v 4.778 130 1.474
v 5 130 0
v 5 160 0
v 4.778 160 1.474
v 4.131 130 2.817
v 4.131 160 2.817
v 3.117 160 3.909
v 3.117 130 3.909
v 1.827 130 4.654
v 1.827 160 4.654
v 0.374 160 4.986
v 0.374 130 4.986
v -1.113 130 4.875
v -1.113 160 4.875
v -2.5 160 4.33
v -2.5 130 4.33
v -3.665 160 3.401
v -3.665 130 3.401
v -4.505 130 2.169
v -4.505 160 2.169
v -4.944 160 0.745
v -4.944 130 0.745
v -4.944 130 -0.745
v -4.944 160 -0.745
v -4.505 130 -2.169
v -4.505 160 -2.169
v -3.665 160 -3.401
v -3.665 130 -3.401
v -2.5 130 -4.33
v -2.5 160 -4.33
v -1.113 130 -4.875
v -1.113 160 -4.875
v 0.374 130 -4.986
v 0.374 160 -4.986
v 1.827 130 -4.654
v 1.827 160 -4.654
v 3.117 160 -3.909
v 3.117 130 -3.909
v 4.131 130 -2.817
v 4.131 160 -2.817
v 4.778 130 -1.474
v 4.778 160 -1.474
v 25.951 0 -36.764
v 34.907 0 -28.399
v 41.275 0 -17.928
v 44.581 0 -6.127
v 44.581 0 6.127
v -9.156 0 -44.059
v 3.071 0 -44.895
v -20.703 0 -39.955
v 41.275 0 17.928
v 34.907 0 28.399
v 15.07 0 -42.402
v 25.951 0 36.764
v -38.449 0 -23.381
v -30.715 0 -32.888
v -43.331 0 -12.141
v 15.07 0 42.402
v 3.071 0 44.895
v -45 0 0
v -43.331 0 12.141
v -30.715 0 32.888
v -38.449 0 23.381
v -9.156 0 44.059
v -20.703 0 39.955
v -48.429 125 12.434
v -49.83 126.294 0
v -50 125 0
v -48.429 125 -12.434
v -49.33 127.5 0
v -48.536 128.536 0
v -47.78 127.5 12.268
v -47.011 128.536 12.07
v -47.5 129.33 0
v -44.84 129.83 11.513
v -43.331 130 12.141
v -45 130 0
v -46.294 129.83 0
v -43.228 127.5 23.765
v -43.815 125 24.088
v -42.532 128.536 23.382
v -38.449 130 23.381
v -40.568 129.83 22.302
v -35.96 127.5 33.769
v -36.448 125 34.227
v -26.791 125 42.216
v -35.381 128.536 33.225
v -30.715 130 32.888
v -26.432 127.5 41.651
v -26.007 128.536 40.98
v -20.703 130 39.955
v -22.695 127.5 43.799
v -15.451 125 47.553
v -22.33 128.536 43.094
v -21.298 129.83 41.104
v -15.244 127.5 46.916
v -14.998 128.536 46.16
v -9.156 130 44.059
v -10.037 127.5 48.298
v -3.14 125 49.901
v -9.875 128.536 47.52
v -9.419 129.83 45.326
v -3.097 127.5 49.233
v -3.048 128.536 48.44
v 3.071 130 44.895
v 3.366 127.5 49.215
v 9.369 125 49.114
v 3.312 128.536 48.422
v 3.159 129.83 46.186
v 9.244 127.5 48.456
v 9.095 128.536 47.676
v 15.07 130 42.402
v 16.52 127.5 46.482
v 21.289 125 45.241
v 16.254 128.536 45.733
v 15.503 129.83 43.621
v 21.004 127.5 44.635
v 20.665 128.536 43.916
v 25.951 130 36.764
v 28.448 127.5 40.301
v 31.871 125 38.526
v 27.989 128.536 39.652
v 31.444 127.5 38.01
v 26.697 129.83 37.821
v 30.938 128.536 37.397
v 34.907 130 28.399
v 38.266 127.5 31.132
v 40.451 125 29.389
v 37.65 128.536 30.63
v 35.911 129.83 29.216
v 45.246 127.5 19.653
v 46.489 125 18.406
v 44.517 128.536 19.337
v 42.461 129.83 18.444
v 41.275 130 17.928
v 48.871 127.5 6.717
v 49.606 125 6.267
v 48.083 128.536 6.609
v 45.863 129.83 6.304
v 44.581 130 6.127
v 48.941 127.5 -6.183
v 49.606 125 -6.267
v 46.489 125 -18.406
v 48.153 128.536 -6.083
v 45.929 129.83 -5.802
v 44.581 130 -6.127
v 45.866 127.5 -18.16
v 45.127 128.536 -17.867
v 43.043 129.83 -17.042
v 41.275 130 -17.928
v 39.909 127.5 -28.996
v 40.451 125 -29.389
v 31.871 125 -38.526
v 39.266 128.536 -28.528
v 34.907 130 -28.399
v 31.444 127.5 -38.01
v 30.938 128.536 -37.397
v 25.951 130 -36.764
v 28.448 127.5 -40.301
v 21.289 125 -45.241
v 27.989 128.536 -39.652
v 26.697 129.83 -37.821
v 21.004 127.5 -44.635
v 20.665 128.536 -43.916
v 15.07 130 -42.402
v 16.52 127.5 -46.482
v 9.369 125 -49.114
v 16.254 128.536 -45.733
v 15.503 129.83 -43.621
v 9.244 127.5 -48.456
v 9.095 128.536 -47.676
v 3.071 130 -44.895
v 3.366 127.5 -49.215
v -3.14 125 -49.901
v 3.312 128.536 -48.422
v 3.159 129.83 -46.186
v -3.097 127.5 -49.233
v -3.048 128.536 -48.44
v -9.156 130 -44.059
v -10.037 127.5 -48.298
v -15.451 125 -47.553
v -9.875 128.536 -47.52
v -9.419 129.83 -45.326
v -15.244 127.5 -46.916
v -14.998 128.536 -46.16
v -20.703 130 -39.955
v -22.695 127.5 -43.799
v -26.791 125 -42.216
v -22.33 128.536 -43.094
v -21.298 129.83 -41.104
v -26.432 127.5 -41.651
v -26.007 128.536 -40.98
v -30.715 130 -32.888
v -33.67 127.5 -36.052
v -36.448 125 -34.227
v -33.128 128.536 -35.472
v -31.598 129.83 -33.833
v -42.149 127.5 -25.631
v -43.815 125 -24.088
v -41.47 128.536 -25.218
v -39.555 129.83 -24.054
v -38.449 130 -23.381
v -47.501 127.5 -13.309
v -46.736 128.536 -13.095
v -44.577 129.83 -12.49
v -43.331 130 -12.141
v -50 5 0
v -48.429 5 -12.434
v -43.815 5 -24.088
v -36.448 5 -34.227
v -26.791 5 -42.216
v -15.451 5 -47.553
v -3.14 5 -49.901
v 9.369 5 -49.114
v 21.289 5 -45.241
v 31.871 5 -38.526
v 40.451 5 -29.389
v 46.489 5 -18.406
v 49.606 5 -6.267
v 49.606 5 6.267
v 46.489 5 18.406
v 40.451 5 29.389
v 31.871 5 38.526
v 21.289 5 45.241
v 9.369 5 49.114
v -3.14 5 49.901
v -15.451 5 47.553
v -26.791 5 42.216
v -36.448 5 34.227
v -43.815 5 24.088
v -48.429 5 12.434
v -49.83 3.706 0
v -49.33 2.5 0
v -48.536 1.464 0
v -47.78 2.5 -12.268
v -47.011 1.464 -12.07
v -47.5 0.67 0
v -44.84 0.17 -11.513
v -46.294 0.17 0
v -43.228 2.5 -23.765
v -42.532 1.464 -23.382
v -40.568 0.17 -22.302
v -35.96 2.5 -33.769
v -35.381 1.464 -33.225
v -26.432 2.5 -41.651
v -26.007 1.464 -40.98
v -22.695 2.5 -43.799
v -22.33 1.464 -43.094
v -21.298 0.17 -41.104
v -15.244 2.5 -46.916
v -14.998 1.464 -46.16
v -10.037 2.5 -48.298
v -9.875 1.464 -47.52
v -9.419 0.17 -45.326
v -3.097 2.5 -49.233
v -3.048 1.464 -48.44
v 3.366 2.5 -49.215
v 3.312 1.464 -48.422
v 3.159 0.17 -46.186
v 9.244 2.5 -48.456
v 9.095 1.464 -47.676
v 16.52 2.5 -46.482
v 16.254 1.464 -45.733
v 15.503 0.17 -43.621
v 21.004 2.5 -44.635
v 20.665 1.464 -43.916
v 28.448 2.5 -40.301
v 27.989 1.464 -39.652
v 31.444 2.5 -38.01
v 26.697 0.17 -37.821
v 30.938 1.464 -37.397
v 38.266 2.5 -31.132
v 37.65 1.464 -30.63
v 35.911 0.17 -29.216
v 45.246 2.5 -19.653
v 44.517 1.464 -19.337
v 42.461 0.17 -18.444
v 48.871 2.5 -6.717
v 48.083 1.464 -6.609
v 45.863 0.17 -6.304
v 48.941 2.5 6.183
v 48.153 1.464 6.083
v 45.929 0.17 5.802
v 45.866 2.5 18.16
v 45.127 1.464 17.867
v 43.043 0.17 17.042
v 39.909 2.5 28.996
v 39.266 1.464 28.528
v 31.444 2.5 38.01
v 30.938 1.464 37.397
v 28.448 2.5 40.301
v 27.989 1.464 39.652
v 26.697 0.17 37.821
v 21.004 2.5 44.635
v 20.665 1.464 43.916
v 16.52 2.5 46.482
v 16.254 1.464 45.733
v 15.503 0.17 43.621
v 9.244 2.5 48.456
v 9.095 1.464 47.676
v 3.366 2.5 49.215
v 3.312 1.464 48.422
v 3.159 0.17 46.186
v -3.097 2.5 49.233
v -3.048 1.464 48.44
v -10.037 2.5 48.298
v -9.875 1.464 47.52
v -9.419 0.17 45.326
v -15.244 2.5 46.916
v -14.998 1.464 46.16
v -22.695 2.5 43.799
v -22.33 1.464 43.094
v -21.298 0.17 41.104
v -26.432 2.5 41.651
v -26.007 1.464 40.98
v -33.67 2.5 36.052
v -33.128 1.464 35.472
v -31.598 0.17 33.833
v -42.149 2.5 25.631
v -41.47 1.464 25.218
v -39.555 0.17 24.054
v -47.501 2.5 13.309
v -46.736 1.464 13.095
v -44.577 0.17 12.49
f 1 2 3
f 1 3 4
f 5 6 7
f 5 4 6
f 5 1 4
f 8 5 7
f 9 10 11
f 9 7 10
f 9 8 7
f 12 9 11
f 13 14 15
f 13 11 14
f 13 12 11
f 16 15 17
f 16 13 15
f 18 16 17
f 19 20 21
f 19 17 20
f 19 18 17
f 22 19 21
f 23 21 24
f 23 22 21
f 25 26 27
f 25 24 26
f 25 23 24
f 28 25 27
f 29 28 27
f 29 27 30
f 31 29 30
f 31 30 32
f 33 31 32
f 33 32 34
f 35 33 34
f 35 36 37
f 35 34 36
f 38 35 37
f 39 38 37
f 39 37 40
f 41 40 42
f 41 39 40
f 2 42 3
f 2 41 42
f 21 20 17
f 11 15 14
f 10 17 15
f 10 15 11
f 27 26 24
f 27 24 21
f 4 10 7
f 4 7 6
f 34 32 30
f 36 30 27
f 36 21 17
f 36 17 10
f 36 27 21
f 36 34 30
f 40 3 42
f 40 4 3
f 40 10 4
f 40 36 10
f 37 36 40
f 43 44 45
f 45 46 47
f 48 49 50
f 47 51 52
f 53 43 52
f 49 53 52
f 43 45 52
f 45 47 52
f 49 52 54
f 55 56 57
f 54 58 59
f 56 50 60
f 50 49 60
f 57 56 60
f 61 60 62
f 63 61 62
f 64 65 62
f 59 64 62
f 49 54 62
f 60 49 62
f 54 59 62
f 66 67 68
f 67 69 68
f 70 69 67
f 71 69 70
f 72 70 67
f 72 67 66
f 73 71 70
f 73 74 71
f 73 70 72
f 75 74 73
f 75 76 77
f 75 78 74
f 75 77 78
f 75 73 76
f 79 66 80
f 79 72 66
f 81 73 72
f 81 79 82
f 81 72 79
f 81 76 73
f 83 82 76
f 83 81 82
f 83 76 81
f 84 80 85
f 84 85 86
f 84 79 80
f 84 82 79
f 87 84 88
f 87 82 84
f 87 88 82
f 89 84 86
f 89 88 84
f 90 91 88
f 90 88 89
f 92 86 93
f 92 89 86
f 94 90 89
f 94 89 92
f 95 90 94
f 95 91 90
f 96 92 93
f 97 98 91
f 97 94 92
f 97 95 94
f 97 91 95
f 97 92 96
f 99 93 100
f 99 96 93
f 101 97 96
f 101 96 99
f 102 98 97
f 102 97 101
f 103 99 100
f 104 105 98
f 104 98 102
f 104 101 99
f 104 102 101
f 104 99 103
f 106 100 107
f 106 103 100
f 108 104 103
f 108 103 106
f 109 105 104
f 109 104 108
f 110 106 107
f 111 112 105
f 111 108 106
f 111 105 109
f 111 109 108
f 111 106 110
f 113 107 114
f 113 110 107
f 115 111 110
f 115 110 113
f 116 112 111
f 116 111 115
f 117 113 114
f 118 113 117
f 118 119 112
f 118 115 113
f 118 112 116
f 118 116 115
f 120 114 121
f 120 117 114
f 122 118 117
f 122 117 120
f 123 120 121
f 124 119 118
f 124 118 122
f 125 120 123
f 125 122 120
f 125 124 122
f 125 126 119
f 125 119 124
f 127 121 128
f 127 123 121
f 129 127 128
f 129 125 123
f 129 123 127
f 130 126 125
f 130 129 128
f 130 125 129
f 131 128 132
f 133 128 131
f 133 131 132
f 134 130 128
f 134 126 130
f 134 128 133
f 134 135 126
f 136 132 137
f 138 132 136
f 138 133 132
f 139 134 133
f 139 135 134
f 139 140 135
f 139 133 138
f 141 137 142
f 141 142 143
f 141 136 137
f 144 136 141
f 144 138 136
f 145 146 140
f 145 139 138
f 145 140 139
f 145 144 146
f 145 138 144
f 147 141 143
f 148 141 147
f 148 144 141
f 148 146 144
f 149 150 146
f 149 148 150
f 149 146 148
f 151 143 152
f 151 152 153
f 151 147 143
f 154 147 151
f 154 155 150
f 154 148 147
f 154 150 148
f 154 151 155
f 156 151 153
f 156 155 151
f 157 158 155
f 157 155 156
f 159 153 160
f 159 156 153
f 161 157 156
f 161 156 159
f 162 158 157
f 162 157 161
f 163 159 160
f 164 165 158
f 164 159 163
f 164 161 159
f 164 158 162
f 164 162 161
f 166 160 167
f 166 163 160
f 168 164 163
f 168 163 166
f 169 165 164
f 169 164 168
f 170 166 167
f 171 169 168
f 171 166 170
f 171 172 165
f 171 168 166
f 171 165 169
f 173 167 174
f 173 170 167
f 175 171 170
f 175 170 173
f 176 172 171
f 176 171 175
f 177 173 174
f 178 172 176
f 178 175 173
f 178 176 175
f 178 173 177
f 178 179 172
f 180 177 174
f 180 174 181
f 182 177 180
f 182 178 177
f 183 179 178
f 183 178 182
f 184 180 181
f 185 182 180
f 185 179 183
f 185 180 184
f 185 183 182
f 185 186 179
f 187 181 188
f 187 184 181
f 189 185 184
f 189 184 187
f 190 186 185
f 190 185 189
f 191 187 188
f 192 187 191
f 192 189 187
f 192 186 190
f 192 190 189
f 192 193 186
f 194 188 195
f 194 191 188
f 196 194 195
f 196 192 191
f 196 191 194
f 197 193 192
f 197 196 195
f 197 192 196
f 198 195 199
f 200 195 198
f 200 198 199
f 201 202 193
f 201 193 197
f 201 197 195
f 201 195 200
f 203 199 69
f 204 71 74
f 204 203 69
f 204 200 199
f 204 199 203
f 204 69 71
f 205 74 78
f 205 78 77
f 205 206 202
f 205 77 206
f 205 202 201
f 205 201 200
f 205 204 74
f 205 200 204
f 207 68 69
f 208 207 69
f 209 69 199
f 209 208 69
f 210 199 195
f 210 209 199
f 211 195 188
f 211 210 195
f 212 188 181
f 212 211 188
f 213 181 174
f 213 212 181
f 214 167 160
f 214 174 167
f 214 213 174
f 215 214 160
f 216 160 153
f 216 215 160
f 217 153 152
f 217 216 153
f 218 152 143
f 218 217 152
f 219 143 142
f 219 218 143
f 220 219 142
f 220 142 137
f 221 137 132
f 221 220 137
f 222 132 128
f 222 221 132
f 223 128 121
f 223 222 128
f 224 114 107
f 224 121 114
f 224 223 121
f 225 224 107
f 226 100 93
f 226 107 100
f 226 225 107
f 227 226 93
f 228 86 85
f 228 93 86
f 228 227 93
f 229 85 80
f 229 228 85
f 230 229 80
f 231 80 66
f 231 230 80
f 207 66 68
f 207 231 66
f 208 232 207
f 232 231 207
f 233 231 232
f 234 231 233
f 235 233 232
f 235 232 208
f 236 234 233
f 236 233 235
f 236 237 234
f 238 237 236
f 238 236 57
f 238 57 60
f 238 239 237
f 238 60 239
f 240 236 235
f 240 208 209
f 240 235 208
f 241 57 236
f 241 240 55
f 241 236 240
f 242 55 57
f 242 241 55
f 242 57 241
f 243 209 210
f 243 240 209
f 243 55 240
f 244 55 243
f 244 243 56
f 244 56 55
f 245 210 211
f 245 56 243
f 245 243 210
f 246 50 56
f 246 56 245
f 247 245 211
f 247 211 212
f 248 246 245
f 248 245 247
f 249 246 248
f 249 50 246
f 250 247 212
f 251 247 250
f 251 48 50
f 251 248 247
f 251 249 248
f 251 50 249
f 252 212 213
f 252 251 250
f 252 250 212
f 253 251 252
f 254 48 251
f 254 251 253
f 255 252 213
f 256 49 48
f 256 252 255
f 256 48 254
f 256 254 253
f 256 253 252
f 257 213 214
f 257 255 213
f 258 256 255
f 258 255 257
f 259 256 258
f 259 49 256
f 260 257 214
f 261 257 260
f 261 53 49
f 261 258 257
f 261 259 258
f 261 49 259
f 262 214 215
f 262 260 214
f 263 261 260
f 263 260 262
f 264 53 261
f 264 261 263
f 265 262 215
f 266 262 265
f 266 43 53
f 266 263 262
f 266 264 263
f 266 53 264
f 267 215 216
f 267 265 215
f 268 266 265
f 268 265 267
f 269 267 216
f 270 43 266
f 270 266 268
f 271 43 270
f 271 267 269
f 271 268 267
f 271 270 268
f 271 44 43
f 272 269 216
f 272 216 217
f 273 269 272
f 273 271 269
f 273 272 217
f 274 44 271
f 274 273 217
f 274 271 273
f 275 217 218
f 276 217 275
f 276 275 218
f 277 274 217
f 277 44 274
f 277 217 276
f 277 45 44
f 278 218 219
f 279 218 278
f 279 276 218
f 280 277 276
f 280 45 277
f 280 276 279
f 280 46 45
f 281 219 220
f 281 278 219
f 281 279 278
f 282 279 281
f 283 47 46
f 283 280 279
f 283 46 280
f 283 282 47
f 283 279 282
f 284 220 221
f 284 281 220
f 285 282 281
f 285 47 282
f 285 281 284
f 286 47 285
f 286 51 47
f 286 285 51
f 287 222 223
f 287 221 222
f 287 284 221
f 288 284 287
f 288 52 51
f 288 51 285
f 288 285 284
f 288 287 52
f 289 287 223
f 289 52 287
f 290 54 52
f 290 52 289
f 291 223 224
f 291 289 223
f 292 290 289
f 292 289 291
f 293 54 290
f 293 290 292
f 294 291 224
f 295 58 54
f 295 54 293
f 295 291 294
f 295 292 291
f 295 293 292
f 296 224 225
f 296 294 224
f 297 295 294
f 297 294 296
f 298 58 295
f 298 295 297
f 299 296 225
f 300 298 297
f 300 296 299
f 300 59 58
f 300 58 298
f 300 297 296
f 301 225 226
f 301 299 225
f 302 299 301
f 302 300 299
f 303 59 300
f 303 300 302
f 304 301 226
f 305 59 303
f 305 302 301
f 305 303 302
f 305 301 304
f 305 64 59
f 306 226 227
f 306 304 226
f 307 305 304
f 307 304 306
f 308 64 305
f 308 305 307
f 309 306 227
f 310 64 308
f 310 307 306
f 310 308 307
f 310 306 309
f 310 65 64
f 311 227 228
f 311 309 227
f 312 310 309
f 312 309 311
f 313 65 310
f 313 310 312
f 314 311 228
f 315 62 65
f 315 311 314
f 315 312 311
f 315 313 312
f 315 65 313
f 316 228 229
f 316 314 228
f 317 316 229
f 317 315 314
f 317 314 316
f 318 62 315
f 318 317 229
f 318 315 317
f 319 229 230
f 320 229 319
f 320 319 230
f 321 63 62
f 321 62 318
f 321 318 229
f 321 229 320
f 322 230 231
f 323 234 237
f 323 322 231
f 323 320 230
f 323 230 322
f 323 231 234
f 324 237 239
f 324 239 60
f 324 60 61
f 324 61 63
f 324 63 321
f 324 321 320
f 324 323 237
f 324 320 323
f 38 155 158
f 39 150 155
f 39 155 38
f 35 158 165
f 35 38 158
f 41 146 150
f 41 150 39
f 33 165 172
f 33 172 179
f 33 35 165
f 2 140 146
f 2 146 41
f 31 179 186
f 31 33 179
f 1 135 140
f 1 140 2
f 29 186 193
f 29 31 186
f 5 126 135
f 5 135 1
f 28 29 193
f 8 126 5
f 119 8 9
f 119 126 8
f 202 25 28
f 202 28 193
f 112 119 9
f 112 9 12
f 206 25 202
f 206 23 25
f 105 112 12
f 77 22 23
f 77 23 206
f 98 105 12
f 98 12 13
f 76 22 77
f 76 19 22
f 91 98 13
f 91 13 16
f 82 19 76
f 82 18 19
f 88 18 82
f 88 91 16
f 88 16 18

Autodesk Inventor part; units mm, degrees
ref_plane "YZ Plane" through (0, 0, 0) normal (1, 0, 0) x (0, 1, 0)
ref_plane "XZ Plane" through (0, 0, 0) normal (0, 1, 0) x (-1, 0, 0)
ref_plane "XY Plane" through (0, 0, 0) normal (0, 0, 1) x (1, 0, 0)
sketch "Эскиз1" plane through (0, 0, 0) normal (0, 1, 0) x (-1, 0, 0)
  circle A0 centre (0, 0) radius 50
  dimension "d0" = 100
extrude "Выдавливание1" add sketch "Эскиз1" along normal blind 130
sketch "Эскиз2" plane through (0, 130, 0) normal (0, 1, 0) x (1, 0, 0)
  circle A0 centre (0, 0) radius 5
  dimension "d3" = 10
extrude "Выдавливание2" add sketch "Эскиз2" along normal blind 30
fillet "Сопряжение1" radius 5 2 edges at (50, 130, 0) (50, 0, 0)
properties part number "МоторКолес"
